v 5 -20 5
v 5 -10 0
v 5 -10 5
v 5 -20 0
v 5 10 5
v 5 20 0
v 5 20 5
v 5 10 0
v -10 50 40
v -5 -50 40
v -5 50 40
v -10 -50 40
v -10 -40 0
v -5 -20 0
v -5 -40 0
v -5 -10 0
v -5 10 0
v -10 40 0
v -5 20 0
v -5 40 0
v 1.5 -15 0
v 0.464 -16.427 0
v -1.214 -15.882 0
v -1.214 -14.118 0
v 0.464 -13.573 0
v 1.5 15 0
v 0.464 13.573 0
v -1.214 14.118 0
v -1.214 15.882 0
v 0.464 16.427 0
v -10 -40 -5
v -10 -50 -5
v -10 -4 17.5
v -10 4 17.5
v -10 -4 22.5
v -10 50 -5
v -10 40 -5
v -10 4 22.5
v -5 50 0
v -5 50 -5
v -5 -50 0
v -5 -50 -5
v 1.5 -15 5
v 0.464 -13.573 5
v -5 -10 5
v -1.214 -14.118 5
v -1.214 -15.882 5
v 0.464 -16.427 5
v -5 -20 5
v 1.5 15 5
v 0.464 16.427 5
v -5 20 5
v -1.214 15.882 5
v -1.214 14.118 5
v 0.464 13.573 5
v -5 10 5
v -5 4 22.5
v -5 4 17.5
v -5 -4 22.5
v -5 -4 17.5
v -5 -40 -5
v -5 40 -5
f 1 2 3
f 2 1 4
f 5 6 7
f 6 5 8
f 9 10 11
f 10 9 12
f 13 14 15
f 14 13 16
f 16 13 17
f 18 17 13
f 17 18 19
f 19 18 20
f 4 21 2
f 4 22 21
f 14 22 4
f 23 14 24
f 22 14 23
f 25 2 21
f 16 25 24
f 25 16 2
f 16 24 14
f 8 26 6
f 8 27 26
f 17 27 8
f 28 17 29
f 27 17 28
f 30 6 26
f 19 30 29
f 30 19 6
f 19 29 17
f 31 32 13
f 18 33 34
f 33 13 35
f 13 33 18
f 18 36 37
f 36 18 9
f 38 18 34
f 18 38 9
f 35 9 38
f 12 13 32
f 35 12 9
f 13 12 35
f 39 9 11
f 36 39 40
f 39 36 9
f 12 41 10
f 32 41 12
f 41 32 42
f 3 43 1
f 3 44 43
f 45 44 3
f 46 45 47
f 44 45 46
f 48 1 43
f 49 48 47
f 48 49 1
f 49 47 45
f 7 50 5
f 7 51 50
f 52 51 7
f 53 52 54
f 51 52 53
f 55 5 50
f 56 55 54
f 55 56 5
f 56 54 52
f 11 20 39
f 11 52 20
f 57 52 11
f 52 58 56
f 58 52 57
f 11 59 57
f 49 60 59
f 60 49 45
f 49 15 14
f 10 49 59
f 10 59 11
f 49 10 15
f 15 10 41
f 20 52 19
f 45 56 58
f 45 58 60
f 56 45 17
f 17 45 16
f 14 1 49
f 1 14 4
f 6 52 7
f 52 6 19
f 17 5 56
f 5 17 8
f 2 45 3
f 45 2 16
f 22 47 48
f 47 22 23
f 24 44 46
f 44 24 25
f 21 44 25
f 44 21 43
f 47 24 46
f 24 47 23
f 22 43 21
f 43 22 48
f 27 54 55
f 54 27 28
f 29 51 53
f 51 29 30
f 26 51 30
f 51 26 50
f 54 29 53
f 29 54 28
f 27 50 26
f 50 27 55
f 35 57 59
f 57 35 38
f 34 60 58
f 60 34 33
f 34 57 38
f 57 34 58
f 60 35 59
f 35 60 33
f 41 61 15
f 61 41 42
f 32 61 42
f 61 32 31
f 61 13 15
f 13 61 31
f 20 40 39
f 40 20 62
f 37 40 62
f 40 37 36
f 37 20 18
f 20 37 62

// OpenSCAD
module Vision_Capteur()
{
    cube([5, 8, 5], true);
}

union()
{
    difference()
    {
        // Base
        translate([-10, -50, 0]) cube([15, 100, 40]);
        translate([ -5, -50, 5]) cube([10, 100, 35]);
    
        // Pattes de fixations
        translate([ 0, -35, 2.5]) cube([10, 30, 5], true);
        translate([ 0,  35, 2.5]) cube([10, 30, 5], true);
        translate([ 0,   0, 2.5]) cube([10, 20, 5], true);
        translate([ 0, -15, 0]) cylinder(h = 5, r = 1.5);
        translate([ 0,  15, 0]) cylinder(h = 5, r = 1.5);
    
        // Vision Capteur
        translate([ -7.5, 0, 20]) Vision_Capteur();
    }
    
    // Support Capteur
    
    // Remplissage bord pelle
    translate([-7.5, -45, -2.5]) cube([5, 10, 5], true);
    translate([-7.5,  45, -2.5]) cube([5, 10, 5], true);
}    
    
